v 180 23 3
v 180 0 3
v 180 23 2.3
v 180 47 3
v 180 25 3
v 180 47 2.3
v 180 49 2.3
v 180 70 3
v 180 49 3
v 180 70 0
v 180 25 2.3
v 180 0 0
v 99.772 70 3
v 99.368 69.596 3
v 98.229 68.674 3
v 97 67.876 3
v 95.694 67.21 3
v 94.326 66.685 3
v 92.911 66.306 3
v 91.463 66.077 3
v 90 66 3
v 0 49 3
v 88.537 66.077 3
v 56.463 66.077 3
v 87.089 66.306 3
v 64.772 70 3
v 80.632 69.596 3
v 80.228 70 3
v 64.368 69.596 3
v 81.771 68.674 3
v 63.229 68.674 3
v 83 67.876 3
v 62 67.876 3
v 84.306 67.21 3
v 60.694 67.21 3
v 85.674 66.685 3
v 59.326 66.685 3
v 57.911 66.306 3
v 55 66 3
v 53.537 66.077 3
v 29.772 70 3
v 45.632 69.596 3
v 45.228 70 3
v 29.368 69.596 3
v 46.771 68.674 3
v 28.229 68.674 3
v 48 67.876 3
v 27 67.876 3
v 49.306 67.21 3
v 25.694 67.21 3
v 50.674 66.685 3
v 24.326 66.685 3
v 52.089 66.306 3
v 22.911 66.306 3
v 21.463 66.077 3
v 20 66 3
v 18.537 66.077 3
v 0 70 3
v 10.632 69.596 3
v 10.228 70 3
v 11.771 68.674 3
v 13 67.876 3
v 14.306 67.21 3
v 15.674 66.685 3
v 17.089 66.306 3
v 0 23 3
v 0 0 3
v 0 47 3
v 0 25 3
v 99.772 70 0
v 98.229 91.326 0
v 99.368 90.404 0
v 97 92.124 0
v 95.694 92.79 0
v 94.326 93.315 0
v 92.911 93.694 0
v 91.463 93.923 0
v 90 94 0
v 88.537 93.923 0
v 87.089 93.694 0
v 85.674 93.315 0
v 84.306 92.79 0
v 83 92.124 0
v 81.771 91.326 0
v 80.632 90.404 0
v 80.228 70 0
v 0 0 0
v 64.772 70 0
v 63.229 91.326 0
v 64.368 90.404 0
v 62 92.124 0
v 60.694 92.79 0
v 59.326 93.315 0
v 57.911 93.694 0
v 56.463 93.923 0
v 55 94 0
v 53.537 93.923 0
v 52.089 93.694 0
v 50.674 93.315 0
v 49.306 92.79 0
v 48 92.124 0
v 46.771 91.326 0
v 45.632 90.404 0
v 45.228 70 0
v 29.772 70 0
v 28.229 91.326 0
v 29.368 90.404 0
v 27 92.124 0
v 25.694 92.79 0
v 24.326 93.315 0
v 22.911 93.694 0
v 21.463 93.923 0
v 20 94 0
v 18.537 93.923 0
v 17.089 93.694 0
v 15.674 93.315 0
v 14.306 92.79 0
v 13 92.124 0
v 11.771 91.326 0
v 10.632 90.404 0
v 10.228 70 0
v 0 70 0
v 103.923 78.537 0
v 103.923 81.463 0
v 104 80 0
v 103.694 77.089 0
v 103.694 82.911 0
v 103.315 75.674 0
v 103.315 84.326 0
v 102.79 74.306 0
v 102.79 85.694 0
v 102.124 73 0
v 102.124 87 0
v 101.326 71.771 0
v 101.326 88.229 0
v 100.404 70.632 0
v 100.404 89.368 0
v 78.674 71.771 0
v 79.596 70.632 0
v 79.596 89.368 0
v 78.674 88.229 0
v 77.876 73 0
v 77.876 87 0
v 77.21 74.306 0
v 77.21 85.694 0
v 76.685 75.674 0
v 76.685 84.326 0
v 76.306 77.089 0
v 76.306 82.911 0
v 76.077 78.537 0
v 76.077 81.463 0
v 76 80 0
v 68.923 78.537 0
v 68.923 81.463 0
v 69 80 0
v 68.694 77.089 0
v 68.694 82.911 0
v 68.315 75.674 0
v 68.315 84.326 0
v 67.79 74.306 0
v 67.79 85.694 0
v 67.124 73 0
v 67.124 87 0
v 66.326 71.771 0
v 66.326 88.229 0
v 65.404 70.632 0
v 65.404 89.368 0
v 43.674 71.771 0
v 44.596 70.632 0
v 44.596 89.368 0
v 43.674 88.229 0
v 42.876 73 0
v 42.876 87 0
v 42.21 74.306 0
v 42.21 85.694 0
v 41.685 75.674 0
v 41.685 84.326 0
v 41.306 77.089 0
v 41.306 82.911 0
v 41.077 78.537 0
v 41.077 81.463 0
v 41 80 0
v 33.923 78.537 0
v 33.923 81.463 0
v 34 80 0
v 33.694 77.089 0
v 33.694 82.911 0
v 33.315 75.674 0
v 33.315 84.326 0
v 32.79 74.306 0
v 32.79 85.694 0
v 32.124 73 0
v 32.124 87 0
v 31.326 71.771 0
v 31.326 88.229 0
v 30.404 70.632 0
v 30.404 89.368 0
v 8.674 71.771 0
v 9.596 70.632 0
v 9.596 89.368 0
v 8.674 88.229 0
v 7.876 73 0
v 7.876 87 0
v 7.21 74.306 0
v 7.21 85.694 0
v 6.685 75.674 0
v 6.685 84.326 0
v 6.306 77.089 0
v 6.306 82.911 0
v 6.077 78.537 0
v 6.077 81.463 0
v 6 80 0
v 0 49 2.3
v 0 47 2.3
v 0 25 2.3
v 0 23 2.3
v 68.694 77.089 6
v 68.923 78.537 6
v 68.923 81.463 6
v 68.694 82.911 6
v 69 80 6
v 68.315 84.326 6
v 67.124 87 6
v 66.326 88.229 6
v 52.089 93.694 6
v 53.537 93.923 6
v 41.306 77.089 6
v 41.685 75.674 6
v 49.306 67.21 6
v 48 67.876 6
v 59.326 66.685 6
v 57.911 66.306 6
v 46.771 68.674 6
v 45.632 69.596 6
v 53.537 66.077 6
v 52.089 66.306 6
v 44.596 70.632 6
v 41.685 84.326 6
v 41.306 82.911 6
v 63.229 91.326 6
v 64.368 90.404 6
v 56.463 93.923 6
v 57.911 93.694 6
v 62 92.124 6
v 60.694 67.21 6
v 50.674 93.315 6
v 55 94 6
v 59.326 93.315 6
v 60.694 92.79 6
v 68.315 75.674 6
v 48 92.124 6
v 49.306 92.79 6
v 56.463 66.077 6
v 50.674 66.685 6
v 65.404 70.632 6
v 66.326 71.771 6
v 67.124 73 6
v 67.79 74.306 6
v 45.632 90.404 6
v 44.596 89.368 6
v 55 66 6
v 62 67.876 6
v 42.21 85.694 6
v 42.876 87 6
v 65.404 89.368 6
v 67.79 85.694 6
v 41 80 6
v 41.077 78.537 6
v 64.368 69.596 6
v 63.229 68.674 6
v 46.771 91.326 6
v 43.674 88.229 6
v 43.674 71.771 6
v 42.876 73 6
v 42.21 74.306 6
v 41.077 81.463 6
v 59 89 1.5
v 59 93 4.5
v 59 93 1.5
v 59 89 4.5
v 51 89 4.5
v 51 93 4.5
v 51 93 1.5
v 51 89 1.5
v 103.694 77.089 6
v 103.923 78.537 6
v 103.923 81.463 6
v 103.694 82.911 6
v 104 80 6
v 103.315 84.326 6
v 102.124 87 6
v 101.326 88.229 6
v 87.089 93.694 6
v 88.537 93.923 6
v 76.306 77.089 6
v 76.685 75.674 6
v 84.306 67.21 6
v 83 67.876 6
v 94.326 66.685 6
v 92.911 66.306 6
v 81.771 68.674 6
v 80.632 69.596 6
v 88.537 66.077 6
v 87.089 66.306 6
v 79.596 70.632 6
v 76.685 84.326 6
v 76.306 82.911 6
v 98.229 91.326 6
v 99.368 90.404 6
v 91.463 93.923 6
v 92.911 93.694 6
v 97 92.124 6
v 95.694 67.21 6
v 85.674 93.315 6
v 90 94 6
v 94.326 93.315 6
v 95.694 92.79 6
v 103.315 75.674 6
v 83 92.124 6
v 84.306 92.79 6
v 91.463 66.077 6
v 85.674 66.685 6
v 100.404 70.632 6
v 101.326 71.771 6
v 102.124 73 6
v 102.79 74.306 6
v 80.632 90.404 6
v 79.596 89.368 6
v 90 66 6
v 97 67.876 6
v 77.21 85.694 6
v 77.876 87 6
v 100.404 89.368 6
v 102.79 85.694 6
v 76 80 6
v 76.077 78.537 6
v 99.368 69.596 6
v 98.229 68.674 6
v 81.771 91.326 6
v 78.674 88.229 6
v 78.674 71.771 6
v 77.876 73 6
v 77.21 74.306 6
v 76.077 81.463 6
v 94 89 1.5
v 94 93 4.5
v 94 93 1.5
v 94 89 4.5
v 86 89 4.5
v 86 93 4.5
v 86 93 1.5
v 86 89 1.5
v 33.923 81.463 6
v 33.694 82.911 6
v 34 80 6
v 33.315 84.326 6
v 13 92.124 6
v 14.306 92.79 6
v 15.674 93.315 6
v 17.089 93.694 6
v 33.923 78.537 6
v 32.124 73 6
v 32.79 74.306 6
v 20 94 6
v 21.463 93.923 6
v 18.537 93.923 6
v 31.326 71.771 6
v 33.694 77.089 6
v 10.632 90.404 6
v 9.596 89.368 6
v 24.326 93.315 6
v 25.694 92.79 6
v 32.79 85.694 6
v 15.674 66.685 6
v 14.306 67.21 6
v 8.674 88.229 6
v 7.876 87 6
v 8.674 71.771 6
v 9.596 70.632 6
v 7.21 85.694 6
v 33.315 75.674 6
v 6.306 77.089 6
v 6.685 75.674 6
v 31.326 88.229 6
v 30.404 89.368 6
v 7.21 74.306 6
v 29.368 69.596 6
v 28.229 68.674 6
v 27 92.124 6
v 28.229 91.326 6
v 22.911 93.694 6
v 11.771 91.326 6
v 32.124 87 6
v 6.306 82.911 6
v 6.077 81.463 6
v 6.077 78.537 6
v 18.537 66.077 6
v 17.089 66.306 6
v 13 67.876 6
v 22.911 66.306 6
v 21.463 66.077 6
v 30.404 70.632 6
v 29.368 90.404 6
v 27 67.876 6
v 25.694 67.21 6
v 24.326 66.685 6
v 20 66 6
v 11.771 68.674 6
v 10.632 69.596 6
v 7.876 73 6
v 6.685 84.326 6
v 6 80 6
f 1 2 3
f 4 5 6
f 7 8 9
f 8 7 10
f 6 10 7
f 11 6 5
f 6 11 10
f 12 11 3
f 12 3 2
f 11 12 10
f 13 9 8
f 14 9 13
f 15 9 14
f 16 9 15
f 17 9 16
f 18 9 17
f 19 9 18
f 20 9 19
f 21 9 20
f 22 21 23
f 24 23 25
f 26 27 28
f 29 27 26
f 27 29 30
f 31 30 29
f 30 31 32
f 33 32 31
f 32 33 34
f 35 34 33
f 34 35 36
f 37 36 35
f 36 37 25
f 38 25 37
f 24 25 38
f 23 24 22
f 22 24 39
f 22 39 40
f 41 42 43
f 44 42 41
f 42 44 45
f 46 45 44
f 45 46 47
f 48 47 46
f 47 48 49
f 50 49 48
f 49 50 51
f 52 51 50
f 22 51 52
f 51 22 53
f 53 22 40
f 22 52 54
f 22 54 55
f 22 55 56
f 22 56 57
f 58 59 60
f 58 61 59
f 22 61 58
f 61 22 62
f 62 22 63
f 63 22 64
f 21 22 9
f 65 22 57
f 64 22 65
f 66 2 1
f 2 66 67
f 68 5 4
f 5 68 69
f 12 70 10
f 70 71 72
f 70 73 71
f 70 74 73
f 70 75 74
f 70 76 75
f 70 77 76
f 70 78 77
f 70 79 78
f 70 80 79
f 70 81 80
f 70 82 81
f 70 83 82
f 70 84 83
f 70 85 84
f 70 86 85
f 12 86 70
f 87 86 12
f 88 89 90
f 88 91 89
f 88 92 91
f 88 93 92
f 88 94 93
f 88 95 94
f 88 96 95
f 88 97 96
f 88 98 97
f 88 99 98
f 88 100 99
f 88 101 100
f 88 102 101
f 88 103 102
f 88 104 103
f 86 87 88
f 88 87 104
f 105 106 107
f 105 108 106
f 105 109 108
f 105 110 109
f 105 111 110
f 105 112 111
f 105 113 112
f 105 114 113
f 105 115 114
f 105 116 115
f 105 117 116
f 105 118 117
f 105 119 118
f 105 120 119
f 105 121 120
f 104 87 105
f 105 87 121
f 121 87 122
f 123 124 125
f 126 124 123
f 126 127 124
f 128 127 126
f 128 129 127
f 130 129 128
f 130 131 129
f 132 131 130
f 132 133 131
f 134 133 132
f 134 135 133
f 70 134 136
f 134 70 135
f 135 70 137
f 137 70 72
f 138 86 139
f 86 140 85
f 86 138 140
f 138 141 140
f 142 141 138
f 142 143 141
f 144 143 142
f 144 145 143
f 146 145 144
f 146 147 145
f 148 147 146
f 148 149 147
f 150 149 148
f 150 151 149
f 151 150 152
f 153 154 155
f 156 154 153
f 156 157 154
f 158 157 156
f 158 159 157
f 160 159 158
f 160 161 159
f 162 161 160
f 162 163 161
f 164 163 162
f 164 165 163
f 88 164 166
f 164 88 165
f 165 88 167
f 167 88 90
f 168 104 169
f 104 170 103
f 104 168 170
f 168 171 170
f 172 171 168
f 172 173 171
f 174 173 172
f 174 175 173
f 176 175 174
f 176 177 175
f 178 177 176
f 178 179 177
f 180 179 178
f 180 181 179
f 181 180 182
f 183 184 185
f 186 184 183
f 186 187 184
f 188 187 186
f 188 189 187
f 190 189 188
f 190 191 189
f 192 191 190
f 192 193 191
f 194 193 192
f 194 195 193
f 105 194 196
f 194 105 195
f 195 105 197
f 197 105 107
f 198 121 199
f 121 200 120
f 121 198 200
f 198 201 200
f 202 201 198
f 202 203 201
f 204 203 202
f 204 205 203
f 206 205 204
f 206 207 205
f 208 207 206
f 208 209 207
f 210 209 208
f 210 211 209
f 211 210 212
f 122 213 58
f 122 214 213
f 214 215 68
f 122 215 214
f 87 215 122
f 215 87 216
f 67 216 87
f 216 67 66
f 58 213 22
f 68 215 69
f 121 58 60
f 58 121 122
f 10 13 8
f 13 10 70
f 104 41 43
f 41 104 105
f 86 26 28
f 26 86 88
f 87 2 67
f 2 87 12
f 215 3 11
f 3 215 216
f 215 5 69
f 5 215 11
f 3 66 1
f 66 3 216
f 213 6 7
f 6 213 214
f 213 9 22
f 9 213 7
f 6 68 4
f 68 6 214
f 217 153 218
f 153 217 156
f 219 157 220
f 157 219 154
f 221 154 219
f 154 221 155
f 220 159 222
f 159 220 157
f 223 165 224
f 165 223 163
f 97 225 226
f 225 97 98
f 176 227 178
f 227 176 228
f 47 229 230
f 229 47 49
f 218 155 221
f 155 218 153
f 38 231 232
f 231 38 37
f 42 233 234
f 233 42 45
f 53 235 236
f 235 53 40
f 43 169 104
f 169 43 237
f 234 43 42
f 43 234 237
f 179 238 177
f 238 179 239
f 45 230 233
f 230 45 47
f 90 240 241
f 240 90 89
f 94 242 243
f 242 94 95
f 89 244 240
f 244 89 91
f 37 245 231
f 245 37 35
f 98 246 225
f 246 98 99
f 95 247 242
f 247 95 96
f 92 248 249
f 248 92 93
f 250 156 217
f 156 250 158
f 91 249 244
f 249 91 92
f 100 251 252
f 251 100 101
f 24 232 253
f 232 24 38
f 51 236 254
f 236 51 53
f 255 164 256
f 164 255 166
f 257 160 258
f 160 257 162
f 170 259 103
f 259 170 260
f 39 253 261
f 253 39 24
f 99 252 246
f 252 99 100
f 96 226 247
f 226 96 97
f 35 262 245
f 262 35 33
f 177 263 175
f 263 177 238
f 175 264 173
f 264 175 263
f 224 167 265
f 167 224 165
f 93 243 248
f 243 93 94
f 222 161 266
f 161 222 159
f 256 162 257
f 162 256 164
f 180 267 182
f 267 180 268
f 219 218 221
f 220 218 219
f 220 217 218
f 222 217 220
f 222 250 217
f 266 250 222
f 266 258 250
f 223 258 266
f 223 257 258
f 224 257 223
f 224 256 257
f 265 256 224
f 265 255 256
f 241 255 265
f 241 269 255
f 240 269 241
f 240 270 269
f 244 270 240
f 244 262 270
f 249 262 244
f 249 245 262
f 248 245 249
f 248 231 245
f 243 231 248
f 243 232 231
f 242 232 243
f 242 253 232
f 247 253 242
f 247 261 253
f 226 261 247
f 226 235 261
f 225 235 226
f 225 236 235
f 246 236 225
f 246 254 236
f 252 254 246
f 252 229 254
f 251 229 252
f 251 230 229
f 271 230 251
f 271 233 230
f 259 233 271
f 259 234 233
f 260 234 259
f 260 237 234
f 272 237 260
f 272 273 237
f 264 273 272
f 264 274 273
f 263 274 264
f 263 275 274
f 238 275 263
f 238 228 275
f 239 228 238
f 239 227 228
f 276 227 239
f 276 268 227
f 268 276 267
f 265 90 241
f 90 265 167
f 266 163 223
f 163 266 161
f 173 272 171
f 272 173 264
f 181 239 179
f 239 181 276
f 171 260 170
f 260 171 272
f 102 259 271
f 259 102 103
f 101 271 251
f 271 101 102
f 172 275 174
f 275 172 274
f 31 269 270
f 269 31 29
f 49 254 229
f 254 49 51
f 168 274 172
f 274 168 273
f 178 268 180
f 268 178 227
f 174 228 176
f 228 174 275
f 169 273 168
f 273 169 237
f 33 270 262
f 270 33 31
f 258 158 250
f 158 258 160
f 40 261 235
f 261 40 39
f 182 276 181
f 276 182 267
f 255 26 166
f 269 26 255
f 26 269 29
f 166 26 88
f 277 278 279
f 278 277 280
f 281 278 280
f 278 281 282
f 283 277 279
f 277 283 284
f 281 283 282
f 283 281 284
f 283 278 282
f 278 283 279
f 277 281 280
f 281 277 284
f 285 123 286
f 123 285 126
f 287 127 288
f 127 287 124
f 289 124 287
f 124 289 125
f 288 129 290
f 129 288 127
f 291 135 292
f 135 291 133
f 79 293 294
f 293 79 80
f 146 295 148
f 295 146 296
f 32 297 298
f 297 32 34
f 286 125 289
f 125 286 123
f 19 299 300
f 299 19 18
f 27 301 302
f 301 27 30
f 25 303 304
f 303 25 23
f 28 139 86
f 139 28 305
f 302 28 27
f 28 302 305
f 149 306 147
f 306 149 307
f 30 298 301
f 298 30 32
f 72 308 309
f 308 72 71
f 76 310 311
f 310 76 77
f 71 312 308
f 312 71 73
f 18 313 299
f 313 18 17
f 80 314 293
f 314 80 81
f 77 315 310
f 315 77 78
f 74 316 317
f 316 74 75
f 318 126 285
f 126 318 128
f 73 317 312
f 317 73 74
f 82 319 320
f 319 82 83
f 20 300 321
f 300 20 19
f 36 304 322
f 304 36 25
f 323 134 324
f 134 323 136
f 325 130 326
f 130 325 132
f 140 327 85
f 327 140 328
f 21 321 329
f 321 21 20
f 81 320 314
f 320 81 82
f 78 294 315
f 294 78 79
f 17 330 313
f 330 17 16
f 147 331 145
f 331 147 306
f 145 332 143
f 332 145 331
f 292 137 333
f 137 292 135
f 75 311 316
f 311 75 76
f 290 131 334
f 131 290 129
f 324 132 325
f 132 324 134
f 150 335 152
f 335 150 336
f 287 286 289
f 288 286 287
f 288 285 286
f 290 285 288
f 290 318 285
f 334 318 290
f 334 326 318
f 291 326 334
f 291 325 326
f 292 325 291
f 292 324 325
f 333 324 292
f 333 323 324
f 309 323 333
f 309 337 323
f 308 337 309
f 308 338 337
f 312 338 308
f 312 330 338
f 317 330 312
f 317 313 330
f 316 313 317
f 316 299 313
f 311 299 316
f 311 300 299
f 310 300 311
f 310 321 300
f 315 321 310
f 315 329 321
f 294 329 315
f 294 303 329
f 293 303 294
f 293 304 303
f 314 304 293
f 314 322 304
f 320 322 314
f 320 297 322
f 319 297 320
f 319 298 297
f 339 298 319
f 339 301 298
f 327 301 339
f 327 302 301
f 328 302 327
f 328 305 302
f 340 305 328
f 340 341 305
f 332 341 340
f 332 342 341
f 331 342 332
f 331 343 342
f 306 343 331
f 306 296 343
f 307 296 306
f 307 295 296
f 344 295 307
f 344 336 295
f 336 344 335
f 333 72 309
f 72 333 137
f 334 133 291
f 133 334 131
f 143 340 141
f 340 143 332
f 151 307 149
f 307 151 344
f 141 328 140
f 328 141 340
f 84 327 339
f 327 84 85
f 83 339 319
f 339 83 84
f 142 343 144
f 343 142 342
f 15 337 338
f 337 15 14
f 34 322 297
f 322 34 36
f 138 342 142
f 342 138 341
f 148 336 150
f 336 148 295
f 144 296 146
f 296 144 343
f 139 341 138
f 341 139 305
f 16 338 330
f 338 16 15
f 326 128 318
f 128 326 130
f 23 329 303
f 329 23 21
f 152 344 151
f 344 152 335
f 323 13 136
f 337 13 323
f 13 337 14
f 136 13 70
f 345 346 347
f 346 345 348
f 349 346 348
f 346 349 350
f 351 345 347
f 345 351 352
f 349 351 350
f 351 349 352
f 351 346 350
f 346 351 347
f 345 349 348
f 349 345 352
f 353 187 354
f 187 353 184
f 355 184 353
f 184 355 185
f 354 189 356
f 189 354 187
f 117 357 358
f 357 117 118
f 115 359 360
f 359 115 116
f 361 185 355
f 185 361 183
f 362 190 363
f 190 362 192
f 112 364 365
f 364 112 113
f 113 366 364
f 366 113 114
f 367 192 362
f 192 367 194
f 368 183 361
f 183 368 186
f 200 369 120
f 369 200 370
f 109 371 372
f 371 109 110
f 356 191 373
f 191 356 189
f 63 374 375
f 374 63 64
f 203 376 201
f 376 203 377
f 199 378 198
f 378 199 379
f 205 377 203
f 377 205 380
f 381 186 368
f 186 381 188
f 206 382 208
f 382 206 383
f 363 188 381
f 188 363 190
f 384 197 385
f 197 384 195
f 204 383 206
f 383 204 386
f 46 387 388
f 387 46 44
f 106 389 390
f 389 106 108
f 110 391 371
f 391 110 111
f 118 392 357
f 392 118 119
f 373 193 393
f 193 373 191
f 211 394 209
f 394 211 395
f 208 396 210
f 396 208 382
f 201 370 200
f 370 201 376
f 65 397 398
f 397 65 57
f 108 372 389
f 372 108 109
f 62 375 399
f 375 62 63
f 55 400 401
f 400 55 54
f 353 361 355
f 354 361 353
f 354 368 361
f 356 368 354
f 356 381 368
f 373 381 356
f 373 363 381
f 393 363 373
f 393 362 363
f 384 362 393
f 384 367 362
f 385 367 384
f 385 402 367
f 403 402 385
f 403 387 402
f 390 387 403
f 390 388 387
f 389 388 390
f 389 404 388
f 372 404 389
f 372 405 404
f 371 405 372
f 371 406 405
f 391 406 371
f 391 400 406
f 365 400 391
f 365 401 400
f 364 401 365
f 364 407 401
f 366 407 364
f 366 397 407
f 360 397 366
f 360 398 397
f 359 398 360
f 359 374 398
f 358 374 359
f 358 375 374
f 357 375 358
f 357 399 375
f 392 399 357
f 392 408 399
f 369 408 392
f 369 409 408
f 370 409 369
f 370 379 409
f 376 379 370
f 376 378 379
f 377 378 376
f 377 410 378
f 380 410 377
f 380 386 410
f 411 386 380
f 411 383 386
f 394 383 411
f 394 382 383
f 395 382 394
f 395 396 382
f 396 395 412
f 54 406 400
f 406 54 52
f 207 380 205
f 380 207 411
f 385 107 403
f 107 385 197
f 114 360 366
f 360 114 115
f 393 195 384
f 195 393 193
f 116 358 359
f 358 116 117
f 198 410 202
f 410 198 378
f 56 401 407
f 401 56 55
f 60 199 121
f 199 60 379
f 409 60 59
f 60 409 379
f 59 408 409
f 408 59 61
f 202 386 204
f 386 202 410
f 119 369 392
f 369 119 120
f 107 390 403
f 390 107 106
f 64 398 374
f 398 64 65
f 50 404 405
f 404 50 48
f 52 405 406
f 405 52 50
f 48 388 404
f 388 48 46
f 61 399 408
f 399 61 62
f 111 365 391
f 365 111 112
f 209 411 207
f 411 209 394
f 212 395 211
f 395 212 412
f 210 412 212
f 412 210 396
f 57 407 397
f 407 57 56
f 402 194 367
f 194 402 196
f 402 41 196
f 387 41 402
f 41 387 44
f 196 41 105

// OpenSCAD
/*
Title: Momentum Collision Token Set
Folder: 09_momentum_impulse
Physics Topic: Momentum and collisions
Difficulty: Beginner-Intermediate
Print Type: FDM, single material
Teaches: Conceptual mechanics
Use Case: Classroom manipulative
*/


// --------------------
// Parameters
// --------------------
token_d = 28;
token_t = 6;
mass_labels = ["1m","2m","3m"];
lane_length = 180;
lane_width = 70;

module mass_token(label="1m", notch=false){
    difference(){
        cylinder(h=token_t,d=token_d,$fn=60);
        if(notch) translate([0,token_d/2-3,token_t/2]) cube([8,4,3],center=true);
    }
}

module collision_lane(){
    difference(){
        cube([lane_length,lane_width,3]);
        translate([0,lane_width/2-12,2.3]) cube([lane_length,2,1]);
        translate([0,lane_width/2+12,2.3]) cube([lane_length,2,1]);
    }
}

// --------------------
// Physics Meaning
// --------------------
// Momentum depends on both mass and velocity direction.

// --------------------
// Learning Notes
// --------------------
// Use arrows to mark pre/post-collision states.

// --------------------
// Print Notes
// --------------------
// Tokens print best in grouped batches.

// --------------------
// Customization Ideas
// --------------------
// Create additional token diameters for rotational collision demos.

collision_lane();
translate([20,80,0]) mass_token("1m",false);
translate([55,80,0]) mass_token("2m",true);
translate([90,80,0]) mass_token("3m",true);
